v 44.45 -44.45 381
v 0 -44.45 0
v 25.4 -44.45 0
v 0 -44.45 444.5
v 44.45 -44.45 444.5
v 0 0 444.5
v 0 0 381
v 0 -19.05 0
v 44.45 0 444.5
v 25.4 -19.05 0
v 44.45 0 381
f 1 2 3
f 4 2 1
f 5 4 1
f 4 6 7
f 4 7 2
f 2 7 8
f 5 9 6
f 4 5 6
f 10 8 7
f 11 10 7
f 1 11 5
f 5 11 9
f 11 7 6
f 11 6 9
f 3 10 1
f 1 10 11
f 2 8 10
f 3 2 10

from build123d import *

# Parameters (mm, degrees)
F1_DEPTH = 44.45
F3_DEPTH = 44.451


with BuildPart() as f1:
    # F0 (on Front) → F1 (new body)
    with BuildSketch(Plane.XZ):
        Polygon((0, 444.5), (0, 0), (25.4, 0), (44.45, 381), (44.45, 444.5), align=None)
    extrude(amount=F1_DEPTH)

    # F2 (on face) → F3 (cut, through all)
    with BuildSketch(Plane(origin=(0, 0, 0), x_dir=(0, -1, 0), z_dir=(-1, 0, 0))):
        Polygon((0, 381), (0, 0), (19.05, 0), align=None)
    extrude(amount=-F3_DEPTH, mode=Mode.SUBTRACT)


solid = f1.part
